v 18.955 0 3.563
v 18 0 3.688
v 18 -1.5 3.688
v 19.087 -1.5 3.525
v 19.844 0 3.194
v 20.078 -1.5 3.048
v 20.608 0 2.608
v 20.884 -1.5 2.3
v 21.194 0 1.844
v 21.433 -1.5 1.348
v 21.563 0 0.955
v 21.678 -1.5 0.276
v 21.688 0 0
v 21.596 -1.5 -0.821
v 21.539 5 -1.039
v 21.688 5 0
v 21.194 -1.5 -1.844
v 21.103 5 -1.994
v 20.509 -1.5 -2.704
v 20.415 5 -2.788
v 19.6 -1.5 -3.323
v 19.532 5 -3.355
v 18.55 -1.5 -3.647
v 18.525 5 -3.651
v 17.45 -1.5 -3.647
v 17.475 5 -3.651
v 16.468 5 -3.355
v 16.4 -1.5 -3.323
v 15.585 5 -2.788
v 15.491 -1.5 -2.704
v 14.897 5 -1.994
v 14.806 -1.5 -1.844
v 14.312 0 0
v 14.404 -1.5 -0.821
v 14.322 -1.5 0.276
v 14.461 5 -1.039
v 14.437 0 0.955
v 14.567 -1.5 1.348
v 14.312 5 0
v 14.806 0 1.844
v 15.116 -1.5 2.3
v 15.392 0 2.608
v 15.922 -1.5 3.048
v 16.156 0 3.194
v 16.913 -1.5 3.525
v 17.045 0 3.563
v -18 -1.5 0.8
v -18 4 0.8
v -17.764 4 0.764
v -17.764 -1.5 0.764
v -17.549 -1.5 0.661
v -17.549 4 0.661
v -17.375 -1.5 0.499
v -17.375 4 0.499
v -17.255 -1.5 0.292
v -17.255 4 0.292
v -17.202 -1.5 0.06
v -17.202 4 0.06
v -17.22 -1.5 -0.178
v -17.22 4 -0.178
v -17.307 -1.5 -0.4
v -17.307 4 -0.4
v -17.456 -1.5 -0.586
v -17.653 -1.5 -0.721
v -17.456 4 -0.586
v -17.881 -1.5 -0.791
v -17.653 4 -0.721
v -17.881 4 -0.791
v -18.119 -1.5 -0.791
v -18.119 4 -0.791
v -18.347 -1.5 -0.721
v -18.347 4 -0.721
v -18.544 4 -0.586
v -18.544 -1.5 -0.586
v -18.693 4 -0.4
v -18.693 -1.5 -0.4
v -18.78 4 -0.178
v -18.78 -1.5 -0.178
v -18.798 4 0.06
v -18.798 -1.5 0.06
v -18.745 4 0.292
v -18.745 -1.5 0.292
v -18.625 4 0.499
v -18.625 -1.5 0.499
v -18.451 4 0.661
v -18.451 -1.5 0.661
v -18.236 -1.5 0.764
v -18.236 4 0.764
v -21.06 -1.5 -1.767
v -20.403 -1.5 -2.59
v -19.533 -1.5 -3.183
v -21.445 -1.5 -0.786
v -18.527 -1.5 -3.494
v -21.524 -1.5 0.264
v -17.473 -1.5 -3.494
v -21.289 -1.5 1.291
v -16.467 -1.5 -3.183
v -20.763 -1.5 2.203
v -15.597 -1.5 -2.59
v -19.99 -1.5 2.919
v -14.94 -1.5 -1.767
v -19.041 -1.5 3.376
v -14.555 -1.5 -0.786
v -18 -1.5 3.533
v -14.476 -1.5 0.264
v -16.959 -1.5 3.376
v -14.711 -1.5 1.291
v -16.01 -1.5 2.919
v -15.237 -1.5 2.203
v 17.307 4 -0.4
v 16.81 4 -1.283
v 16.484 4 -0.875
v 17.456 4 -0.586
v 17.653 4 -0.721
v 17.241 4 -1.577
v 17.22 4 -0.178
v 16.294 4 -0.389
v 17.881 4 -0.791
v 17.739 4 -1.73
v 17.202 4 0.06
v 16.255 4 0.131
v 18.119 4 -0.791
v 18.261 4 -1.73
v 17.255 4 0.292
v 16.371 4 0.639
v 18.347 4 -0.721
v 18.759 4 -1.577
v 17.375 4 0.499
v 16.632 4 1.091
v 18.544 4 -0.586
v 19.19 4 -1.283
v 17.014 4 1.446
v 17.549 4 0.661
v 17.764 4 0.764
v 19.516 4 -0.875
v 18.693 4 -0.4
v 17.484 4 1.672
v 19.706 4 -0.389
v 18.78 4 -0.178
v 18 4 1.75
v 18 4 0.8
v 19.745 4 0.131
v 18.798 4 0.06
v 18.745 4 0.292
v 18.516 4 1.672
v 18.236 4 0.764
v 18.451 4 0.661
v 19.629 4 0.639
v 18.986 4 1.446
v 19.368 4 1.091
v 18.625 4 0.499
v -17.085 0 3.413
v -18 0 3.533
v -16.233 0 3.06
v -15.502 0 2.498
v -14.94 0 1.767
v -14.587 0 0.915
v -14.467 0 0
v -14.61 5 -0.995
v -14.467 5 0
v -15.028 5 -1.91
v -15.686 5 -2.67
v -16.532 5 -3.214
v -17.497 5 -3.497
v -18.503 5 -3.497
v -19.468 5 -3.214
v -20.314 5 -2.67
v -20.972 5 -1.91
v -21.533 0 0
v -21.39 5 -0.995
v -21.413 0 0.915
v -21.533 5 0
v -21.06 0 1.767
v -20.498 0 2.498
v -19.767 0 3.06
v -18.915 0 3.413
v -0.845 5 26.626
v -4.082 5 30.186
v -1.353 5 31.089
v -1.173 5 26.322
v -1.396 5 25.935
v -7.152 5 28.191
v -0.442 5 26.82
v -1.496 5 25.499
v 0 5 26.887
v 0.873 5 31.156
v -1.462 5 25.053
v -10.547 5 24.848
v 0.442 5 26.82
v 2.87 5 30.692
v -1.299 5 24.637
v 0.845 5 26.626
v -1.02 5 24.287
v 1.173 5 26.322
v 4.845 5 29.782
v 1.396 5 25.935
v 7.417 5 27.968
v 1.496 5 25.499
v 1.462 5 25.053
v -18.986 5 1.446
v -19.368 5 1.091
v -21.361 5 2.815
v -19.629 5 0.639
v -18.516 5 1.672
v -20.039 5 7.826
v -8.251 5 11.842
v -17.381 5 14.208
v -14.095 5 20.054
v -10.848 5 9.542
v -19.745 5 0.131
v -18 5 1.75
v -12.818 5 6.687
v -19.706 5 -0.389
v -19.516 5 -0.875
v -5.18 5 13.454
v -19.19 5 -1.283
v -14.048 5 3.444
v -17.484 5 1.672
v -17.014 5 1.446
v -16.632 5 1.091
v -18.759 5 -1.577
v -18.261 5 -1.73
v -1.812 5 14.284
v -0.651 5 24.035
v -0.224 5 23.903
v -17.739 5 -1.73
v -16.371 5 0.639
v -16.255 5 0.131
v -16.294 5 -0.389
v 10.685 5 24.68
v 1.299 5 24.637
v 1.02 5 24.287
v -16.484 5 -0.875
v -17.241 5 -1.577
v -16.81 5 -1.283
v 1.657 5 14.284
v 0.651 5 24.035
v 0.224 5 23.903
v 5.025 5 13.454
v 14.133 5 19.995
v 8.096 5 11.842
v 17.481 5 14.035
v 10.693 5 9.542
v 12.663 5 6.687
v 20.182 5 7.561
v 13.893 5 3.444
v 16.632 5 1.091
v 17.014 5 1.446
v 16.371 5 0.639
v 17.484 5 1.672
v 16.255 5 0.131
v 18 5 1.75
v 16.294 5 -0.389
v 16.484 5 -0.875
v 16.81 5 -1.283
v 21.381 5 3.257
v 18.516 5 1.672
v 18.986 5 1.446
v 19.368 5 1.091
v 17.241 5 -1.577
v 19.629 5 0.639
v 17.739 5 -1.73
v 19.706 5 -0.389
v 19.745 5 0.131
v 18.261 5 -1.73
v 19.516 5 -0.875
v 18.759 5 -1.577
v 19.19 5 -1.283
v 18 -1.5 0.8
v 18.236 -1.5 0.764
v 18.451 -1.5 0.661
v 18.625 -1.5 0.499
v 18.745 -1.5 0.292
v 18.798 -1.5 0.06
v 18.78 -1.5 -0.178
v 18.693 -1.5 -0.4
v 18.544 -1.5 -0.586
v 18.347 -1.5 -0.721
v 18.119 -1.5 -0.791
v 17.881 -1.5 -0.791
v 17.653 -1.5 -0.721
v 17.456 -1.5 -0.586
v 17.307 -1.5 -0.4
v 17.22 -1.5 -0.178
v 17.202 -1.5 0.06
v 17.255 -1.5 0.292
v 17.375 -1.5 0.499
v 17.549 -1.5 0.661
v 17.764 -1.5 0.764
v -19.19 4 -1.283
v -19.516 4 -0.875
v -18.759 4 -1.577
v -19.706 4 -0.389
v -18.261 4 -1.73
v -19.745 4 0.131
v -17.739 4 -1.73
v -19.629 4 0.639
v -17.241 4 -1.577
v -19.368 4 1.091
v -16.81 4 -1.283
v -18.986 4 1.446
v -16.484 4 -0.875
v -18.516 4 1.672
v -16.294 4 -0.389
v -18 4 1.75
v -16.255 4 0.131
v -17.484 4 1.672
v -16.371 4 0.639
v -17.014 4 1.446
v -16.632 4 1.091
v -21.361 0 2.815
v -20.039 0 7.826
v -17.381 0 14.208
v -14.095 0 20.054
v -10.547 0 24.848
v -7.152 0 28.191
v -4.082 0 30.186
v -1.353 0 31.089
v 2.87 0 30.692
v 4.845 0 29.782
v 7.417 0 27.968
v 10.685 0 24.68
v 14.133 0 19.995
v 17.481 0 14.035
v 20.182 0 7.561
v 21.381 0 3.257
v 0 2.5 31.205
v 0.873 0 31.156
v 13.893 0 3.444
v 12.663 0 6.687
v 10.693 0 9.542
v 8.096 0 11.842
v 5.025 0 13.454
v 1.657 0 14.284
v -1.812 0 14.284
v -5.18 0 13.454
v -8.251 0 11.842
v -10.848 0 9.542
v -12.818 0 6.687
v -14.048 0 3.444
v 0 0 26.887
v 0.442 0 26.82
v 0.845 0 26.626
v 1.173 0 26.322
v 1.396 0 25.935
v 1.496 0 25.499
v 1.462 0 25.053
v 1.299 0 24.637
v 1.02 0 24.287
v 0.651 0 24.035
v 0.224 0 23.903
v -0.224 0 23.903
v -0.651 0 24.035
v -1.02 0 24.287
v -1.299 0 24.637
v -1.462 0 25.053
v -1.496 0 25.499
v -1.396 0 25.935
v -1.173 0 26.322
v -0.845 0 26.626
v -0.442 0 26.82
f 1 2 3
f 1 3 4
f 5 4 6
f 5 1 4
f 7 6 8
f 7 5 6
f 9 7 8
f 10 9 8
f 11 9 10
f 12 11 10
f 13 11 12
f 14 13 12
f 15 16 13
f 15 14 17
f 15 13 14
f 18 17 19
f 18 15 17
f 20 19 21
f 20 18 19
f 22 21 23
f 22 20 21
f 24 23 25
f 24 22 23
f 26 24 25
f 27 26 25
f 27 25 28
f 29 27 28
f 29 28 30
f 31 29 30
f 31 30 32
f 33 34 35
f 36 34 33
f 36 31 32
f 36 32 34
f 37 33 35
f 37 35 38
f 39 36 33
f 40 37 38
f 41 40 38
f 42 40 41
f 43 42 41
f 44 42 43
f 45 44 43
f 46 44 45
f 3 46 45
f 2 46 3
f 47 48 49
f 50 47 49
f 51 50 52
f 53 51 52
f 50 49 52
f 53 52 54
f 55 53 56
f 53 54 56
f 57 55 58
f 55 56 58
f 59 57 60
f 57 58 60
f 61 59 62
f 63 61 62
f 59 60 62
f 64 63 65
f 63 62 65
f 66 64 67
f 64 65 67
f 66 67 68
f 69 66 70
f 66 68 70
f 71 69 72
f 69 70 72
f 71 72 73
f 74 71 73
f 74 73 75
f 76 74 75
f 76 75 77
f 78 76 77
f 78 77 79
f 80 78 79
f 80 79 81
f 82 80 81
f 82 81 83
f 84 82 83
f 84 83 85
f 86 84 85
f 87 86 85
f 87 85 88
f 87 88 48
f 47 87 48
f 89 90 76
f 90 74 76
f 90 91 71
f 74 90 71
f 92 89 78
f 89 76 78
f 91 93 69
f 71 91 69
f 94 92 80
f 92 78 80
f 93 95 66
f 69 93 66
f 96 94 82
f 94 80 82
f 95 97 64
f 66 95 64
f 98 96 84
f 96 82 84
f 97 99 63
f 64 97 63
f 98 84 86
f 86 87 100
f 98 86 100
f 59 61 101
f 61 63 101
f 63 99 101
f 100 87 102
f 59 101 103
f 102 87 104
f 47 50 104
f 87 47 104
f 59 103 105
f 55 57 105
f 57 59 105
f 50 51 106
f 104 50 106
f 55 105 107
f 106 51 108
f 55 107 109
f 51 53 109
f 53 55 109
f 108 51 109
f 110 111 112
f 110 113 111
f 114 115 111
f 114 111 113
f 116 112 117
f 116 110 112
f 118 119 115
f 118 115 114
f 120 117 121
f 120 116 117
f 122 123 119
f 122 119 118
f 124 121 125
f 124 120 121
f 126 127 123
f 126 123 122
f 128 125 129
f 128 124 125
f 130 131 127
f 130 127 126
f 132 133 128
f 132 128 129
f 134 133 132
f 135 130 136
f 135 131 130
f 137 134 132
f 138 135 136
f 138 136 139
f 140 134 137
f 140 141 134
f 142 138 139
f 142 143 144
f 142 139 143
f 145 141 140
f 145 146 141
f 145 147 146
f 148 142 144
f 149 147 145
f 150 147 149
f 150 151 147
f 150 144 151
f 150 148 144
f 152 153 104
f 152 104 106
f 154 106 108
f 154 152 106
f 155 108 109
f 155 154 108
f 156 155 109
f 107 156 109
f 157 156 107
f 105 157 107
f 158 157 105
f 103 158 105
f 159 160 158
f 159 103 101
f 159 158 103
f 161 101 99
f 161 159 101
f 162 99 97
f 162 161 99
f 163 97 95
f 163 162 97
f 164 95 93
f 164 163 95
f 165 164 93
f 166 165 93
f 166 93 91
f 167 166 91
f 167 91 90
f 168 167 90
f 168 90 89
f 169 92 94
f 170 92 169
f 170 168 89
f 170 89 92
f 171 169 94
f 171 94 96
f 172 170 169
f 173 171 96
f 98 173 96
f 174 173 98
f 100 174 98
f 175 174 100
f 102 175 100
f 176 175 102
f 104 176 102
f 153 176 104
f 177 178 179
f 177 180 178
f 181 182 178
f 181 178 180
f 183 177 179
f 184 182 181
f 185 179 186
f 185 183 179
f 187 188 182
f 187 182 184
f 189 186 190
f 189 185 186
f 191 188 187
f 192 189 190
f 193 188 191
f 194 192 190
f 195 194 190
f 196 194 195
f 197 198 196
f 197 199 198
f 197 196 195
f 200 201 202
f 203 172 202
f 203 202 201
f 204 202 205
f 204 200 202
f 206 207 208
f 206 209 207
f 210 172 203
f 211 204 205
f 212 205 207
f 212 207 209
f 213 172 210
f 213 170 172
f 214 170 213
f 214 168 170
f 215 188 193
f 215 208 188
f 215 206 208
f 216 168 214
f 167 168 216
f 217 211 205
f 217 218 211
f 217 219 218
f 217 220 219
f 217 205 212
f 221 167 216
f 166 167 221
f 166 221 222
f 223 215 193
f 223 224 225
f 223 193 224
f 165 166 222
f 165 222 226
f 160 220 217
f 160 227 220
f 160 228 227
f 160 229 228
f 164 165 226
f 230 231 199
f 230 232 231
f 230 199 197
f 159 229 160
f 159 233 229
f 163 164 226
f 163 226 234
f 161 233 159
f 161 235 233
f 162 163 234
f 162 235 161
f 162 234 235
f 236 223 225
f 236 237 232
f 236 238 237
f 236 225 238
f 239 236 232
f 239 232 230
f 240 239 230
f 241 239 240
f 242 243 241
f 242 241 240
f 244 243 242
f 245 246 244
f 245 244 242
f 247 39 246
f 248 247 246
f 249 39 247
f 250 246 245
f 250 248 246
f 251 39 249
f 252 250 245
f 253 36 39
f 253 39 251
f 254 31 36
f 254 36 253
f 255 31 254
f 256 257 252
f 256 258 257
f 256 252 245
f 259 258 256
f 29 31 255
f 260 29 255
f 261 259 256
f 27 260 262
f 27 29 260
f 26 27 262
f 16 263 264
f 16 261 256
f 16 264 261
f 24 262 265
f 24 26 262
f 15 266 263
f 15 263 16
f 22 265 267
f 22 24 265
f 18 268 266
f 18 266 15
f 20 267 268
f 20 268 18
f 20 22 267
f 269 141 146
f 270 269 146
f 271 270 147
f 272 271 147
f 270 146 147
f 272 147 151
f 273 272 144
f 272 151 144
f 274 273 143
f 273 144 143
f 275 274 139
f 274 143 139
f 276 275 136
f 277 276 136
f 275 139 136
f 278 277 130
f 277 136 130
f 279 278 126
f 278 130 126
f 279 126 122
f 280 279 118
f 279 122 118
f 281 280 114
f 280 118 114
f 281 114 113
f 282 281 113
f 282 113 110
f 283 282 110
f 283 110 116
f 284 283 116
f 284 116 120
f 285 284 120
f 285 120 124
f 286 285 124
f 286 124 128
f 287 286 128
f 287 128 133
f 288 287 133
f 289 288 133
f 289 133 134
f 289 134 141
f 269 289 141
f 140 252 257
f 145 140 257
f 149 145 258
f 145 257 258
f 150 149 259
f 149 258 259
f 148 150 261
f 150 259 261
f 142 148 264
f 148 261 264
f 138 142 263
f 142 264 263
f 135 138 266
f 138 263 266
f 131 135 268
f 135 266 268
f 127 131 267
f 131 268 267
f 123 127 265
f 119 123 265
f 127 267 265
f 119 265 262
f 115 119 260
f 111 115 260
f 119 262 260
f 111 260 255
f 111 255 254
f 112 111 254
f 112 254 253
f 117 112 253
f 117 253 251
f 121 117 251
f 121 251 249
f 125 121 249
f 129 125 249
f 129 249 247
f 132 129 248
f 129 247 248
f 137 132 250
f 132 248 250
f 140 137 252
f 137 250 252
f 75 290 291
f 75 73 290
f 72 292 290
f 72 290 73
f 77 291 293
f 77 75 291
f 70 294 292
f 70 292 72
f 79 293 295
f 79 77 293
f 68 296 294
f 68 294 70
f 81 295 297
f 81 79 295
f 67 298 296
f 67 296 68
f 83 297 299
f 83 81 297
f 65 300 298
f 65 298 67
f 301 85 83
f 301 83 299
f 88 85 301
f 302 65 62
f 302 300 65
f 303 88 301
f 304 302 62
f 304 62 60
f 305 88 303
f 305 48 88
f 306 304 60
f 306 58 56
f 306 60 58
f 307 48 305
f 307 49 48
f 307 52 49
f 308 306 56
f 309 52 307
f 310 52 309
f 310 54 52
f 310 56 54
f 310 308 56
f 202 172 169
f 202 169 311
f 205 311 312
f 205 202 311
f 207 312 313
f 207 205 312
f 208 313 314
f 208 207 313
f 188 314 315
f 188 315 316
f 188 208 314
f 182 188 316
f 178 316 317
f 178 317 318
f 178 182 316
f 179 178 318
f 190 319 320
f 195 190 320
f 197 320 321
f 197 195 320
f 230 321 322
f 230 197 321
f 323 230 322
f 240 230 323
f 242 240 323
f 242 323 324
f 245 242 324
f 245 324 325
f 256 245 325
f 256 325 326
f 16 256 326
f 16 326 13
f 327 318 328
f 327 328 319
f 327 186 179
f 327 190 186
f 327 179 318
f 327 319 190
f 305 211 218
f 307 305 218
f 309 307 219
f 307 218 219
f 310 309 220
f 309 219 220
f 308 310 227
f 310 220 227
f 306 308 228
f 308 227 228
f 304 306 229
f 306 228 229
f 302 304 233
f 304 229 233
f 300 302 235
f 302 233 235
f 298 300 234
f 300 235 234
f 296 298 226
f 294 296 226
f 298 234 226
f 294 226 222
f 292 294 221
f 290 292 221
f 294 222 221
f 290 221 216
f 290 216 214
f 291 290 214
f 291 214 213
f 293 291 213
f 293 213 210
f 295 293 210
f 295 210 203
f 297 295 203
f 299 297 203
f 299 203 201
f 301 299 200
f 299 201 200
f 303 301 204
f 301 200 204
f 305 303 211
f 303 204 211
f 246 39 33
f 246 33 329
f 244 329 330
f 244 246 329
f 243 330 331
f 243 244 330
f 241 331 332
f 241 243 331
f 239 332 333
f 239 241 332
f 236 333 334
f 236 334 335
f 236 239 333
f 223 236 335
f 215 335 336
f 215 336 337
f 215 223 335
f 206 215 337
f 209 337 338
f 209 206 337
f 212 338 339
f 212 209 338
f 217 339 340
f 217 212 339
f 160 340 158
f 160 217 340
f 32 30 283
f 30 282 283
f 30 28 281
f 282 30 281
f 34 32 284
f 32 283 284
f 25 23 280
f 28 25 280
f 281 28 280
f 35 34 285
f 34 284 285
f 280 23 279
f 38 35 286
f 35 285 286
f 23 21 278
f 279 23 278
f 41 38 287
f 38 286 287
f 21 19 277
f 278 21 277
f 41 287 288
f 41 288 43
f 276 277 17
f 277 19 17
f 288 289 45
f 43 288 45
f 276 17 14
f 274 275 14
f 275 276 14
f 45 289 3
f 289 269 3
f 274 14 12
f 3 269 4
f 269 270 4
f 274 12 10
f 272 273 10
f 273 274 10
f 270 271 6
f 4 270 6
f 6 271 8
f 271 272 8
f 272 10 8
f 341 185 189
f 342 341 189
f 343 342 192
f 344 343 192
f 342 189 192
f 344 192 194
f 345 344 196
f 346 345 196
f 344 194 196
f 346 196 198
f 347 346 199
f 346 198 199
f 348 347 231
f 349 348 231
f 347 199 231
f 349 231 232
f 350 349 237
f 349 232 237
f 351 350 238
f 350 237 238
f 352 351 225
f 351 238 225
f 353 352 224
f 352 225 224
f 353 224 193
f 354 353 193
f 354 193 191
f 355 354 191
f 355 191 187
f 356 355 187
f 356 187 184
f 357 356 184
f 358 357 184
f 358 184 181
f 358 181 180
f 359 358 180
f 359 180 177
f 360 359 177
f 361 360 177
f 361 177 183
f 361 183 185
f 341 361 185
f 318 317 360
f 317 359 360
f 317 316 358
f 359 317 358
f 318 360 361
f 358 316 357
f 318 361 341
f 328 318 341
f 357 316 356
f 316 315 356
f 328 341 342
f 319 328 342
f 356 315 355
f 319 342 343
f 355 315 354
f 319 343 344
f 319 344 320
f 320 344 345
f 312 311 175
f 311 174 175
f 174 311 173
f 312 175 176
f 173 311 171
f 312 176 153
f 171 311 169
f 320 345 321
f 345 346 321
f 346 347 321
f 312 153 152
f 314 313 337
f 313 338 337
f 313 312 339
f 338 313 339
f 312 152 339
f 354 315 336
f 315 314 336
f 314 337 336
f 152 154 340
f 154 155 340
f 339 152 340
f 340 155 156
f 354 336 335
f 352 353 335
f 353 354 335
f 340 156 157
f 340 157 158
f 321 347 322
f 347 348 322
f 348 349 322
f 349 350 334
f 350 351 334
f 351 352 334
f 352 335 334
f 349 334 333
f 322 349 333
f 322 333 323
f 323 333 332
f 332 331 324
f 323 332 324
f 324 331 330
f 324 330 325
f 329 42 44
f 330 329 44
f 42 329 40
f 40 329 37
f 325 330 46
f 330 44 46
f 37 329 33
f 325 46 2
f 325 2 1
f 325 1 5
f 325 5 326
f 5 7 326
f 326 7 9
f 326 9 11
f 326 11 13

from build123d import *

# Parameters (mm, degrees)
SKETCH6_R             = 3.53339779
BOSS_EXTRUDE4_DEPTH   = 1.5
SKETCH6_R_2           = 3.688460373
BOSS_EXTRUDE4_2_DEPTH = 1.5
BOSS_EXTRUDE5_START   = 5
BOSS_EXTRUDE5_DEPTH   = 5
SKETCH12_R            = 0.8
CUT_EXTRUDE3_DEPTH    = 39.562588294
SKETCH13_R            = 1.75
SCREW_INSET_CUT_DEPTH = 1
CUT_EXTRUDE4_REACH    = 40.563
SKETCH15_R            = 1.5


with BuildPart() as part:
    # Sketch6 → Boss-Extrude4 (new body)
    with BuildSketch(Plane(origin=(0, 0, 0), x_dir=(1, 0, 0), z_dir=(0, 1, 0))):
        with Locations(Location((-18, 0, 0), (0, 0, 270))):
            Circle(SKETCH6_R)
    extrude(amount=-BOSS_EXTRUDE4_DEPTH)



with BuildPart() as body_2:
    # Sketch6 → Boss-Extrude4 2 (new body)
    with BuildSketch(Plane(origin=(0, 0, 0), x_dir=(1, 0, 0), z_dir=(0, 1, 0))):
        with Locations(Location((18, 0, 0), (0, 0, 270))):
            Circle(SKETCH6_R_2)
    extrude(amount=-BOSS_EXTRUDE4_2_DEPTH)


with BuildPart() as part_1:
    add(part.part)

    add(body_2.part)  # Boss-Extrude5 merges body 2
    # Sketch7 → Boss-Extrude5 (add)
    with BuildSketch(Plane(origin=(0, 0, 0), x_dir=(1, 0, 0), z_dir=(0, 1, 0)).offset(BOSS_EXTRUDE5_START)):
        with BuildLine():
            ThreePointArc((14.311539627, 0), (-0.077531291, -14.389070918), (-14.46660221, 0))
            ThreePointArc((-14.46660221, 0), (-18, 3.53339779), (-21.53339779, 0))
            add(Edge.make_bspline(
                [(-21.53339779, 0), (-22.195175759, -7.215488117), (0.037694985, -55.230023243), (22.180786806, -7.144108664), (21.688460373, 0)],
                knots=[0, 0, 0, 0, 0.49965634, 1, 1, 1, 1], degree=3))
            ThreePointArc((21.688460373, 0), (18, 3.688460373), (14.311539627, 0))
        make_face()
    extrude(amount=-BOSS_EXTRUDE5_DEPTH)

    # Sketch12 → Cut-Extrude3 (cut, through all)
    with BuildSketch(Plane(origin=(0, 5, 0), x_dir=(1, 0, 0), z_dir=(0, 1, 0))):
        with Locations(Location((-18, 0, 0), (0, 0, 270))):
            Circle(SKETCH12_R)
        with Locations(Location((18, 0, 0), (0, 0, 270))):
            Circle(SKETCH12_R)
    extrude(amount=-CUT_EXTRUDE3_DEPTH, mode=Mode.SUBTRACT)

    # Sketch13 → Screw Inset Cut (cut)
    with BuildSketch(Plane(origin=(0, 5, 0), x_dir=(1, 0, 0), z_dir=(0, 1, 0))):
        with Locations(Location((-18, 0, 0), (0, 0, 270))):
            Circle(SKETCH13_R)
        with Locations(Location((18, 0, 0), (0, 0, 270))):
            Circle(SKETCH13_R)
    extrude(amount=-SCREW_INSET_CUT_DEPTH, mode=Mode.SUBTRACT)

    # Sketch15 → Cut-Extrude4 (cut, up to next)
    with BuildSketch(Plane(origin=(0, 5, 0), x_dir=(1, 0, 0), z_dir=(0, 1, 0)), mode=Mode.PRIVATE) as cut_extrude4_sk1:
        with Locations(Location((0, -25.386616325, 0), (0, 0, 270))):
            Circle(SKETCH15_R)
    cut_extrude4_tool1 = extrude(cut_extrude4_sk1.sketch, amount=-CUT_EXTRUDE4_REACH, mode=Mode.PRIVATE) & part_1.part
    add(cut_extrude4_tool1.solids().sort_by_distance((0, 5, 25.386616))[0], mode=Mode.SUBTRACT)


solid = part_1.part
